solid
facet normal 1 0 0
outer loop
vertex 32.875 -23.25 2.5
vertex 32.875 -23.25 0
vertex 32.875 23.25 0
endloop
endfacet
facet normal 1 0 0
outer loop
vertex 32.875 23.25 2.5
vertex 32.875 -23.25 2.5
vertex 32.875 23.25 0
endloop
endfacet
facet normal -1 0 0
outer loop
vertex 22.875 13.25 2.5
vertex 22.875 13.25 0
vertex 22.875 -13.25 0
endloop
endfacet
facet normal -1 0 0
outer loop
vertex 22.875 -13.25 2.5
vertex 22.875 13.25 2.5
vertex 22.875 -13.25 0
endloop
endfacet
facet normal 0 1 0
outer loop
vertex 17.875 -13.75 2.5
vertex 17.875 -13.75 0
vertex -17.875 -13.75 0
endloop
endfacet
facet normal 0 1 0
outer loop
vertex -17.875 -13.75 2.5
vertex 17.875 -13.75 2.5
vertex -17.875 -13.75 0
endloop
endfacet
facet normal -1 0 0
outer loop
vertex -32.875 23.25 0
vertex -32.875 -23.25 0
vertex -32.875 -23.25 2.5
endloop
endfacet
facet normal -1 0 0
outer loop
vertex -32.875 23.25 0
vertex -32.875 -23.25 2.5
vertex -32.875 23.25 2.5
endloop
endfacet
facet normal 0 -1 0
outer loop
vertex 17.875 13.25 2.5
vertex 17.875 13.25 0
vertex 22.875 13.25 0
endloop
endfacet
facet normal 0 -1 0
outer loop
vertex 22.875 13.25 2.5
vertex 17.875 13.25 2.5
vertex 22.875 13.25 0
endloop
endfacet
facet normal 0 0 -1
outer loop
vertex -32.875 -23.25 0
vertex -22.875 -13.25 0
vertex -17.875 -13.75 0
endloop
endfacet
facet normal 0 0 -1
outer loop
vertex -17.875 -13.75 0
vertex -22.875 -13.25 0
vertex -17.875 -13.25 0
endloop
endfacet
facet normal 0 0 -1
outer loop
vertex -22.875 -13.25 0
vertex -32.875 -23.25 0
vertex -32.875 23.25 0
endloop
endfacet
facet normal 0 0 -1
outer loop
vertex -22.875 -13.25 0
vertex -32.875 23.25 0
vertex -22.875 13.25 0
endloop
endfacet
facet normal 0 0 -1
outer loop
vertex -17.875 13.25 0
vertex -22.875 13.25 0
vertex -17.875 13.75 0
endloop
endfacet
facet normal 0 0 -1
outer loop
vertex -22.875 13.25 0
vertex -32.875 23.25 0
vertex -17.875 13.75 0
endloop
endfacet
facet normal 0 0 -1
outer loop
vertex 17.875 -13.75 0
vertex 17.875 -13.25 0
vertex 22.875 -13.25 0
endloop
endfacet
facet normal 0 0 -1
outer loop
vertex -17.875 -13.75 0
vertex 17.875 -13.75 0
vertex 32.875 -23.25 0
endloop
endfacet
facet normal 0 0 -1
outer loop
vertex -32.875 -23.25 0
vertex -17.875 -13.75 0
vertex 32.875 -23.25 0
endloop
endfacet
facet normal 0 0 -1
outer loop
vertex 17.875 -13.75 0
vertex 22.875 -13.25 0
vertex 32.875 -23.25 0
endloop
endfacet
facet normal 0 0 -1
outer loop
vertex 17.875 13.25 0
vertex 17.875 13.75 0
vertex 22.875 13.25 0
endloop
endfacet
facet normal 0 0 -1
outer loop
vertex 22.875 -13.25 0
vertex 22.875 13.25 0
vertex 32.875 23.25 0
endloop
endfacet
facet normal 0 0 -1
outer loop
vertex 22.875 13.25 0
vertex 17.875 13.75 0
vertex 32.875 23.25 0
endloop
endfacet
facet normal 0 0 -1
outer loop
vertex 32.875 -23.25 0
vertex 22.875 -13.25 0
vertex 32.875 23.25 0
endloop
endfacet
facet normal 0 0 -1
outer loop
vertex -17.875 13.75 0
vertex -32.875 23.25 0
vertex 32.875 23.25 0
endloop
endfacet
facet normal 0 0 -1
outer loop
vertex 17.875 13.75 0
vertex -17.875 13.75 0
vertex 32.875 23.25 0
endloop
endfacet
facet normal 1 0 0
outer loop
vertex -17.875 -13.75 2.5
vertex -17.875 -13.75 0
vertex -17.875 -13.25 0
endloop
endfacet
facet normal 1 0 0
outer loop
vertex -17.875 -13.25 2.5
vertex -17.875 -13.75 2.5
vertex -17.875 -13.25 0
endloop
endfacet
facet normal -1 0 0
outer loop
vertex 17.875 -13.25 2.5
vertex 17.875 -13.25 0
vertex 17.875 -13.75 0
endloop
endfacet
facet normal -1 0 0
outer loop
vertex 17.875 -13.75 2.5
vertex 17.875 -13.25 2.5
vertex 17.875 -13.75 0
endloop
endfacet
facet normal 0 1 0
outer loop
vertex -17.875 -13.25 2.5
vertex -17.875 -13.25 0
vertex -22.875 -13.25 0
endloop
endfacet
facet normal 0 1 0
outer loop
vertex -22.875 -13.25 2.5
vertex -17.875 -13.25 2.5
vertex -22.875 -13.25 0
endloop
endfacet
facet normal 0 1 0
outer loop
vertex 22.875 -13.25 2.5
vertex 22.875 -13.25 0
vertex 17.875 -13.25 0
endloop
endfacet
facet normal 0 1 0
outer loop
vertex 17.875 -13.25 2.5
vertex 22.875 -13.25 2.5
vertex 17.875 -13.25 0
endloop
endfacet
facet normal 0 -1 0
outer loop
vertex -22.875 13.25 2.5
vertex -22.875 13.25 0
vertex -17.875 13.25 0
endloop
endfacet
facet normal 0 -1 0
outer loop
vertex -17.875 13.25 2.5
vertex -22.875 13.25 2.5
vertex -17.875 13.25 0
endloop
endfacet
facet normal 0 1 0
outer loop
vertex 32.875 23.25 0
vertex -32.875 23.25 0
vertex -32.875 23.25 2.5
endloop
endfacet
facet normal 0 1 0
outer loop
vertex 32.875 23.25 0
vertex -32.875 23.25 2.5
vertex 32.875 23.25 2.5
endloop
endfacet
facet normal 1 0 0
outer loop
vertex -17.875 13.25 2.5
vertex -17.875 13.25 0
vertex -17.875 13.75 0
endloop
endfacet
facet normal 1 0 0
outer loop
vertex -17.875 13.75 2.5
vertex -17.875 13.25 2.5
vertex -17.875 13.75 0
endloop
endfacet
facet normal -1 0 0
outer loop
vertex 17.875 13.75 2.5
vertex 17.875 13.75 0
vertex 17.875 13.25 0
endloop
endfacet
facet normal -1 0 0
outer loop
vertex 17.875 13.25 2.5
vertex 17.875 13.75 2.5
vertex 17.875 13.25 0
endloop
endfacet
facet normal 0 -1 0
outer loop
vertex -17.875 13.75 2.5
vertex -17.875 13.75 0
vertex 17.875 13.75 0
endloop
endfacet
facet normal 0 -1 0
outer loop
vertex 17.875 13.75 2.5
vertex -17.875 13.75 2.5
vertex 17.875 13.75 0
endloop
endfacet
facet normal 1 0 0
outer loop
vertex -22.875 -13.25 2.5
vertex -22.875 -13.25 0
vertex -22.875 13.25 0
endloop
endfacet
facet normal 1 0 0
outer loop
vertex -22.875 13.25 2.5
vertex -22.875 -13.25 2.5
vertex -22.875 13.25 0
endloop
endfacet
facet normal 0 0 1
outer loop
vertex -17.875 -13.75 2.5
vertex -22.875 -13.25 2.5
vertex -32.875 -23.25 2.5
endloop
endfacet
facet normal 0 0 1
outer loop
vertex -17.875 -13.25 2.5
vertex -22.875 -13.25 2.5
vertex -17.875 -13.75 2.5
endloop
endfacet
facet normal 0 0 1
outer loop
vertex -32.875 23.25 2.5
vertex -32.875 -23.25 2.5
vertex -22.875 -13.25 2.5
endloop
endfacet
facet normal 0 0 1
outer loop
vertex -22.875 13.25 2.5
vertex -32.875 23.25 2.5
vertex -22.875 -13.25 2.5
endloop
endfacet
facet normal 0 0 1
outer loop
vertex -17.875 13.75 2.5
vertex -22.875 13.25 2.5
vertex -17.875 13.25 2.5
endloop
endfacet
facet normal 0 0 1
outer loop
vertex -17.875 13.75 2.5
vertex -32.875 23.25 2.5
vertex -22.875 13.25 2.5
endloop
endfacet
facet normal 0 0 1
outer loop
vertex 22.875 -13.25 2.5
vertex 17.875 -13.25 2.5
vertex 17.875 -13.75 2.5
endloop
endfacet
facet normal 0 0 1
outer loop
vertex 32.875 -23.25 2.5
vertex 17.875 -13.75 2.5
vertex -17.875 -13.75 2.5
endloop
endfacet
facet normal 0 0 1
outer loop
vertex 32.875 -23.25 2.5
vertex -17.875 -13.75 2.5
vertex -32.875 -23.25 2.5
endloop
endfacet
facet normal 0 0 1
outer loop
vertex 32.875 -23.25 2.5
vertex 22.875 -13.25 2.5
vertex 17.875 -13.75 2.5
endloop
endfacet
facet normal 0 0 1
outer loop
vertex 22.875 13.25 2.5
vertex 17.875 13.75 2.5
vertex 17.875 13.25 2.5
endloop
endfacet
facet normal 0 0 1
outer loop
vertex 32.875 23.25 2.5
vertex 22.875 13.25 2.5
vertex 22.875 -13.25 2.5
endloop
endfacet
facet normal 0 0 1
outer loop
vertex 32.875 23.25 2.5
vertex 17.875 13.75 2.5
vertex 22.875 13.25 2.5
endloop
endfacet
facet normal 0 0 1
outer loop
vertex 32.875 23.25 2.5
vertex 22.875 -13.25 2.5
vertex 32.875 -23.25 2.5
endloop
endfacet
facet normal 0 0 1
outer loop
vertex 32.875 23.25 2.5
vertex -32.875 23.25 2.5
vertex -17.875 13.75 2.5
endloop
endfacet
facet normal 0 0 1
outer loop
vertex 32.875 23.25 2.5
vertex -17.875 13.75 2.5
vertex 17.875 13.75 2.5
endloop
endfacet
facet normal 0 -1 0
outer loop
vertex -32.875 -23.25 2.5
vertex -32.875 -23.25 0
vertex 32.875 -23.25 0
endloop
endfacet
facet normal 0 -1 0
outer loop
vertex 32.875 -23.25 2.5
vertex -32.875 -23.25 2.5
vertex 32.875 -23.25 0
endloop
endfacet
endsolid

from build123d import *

# Parameters (mm, degrees)
SKETCH_W  = 65.75
SKETCH_H  = 46.5
PAD_DEPTH = 2.5


with BuildPart() as part:
    # Sketch → Pad (new body)
    with BuildSketch(Plane.XY):
        Rectangle(SKETCH_W, SKETCH_H)
        Polygon((-22.875, 13.25), (-17.875, 13.25), (-17.875, 13.75), (17.875, 13.75), (17.875, 13.25), (22.875, 13.25), (22.875, -13.25), (17.875, -13.25), (17.875, -13.75), (-17.875, -13.75), (-17.875, -13.25), (-22.875, -13.25), align=None, mode=Mode.SUBTRACT)
    extrude(amount=PAD_DEPTH)


solid = part.part
